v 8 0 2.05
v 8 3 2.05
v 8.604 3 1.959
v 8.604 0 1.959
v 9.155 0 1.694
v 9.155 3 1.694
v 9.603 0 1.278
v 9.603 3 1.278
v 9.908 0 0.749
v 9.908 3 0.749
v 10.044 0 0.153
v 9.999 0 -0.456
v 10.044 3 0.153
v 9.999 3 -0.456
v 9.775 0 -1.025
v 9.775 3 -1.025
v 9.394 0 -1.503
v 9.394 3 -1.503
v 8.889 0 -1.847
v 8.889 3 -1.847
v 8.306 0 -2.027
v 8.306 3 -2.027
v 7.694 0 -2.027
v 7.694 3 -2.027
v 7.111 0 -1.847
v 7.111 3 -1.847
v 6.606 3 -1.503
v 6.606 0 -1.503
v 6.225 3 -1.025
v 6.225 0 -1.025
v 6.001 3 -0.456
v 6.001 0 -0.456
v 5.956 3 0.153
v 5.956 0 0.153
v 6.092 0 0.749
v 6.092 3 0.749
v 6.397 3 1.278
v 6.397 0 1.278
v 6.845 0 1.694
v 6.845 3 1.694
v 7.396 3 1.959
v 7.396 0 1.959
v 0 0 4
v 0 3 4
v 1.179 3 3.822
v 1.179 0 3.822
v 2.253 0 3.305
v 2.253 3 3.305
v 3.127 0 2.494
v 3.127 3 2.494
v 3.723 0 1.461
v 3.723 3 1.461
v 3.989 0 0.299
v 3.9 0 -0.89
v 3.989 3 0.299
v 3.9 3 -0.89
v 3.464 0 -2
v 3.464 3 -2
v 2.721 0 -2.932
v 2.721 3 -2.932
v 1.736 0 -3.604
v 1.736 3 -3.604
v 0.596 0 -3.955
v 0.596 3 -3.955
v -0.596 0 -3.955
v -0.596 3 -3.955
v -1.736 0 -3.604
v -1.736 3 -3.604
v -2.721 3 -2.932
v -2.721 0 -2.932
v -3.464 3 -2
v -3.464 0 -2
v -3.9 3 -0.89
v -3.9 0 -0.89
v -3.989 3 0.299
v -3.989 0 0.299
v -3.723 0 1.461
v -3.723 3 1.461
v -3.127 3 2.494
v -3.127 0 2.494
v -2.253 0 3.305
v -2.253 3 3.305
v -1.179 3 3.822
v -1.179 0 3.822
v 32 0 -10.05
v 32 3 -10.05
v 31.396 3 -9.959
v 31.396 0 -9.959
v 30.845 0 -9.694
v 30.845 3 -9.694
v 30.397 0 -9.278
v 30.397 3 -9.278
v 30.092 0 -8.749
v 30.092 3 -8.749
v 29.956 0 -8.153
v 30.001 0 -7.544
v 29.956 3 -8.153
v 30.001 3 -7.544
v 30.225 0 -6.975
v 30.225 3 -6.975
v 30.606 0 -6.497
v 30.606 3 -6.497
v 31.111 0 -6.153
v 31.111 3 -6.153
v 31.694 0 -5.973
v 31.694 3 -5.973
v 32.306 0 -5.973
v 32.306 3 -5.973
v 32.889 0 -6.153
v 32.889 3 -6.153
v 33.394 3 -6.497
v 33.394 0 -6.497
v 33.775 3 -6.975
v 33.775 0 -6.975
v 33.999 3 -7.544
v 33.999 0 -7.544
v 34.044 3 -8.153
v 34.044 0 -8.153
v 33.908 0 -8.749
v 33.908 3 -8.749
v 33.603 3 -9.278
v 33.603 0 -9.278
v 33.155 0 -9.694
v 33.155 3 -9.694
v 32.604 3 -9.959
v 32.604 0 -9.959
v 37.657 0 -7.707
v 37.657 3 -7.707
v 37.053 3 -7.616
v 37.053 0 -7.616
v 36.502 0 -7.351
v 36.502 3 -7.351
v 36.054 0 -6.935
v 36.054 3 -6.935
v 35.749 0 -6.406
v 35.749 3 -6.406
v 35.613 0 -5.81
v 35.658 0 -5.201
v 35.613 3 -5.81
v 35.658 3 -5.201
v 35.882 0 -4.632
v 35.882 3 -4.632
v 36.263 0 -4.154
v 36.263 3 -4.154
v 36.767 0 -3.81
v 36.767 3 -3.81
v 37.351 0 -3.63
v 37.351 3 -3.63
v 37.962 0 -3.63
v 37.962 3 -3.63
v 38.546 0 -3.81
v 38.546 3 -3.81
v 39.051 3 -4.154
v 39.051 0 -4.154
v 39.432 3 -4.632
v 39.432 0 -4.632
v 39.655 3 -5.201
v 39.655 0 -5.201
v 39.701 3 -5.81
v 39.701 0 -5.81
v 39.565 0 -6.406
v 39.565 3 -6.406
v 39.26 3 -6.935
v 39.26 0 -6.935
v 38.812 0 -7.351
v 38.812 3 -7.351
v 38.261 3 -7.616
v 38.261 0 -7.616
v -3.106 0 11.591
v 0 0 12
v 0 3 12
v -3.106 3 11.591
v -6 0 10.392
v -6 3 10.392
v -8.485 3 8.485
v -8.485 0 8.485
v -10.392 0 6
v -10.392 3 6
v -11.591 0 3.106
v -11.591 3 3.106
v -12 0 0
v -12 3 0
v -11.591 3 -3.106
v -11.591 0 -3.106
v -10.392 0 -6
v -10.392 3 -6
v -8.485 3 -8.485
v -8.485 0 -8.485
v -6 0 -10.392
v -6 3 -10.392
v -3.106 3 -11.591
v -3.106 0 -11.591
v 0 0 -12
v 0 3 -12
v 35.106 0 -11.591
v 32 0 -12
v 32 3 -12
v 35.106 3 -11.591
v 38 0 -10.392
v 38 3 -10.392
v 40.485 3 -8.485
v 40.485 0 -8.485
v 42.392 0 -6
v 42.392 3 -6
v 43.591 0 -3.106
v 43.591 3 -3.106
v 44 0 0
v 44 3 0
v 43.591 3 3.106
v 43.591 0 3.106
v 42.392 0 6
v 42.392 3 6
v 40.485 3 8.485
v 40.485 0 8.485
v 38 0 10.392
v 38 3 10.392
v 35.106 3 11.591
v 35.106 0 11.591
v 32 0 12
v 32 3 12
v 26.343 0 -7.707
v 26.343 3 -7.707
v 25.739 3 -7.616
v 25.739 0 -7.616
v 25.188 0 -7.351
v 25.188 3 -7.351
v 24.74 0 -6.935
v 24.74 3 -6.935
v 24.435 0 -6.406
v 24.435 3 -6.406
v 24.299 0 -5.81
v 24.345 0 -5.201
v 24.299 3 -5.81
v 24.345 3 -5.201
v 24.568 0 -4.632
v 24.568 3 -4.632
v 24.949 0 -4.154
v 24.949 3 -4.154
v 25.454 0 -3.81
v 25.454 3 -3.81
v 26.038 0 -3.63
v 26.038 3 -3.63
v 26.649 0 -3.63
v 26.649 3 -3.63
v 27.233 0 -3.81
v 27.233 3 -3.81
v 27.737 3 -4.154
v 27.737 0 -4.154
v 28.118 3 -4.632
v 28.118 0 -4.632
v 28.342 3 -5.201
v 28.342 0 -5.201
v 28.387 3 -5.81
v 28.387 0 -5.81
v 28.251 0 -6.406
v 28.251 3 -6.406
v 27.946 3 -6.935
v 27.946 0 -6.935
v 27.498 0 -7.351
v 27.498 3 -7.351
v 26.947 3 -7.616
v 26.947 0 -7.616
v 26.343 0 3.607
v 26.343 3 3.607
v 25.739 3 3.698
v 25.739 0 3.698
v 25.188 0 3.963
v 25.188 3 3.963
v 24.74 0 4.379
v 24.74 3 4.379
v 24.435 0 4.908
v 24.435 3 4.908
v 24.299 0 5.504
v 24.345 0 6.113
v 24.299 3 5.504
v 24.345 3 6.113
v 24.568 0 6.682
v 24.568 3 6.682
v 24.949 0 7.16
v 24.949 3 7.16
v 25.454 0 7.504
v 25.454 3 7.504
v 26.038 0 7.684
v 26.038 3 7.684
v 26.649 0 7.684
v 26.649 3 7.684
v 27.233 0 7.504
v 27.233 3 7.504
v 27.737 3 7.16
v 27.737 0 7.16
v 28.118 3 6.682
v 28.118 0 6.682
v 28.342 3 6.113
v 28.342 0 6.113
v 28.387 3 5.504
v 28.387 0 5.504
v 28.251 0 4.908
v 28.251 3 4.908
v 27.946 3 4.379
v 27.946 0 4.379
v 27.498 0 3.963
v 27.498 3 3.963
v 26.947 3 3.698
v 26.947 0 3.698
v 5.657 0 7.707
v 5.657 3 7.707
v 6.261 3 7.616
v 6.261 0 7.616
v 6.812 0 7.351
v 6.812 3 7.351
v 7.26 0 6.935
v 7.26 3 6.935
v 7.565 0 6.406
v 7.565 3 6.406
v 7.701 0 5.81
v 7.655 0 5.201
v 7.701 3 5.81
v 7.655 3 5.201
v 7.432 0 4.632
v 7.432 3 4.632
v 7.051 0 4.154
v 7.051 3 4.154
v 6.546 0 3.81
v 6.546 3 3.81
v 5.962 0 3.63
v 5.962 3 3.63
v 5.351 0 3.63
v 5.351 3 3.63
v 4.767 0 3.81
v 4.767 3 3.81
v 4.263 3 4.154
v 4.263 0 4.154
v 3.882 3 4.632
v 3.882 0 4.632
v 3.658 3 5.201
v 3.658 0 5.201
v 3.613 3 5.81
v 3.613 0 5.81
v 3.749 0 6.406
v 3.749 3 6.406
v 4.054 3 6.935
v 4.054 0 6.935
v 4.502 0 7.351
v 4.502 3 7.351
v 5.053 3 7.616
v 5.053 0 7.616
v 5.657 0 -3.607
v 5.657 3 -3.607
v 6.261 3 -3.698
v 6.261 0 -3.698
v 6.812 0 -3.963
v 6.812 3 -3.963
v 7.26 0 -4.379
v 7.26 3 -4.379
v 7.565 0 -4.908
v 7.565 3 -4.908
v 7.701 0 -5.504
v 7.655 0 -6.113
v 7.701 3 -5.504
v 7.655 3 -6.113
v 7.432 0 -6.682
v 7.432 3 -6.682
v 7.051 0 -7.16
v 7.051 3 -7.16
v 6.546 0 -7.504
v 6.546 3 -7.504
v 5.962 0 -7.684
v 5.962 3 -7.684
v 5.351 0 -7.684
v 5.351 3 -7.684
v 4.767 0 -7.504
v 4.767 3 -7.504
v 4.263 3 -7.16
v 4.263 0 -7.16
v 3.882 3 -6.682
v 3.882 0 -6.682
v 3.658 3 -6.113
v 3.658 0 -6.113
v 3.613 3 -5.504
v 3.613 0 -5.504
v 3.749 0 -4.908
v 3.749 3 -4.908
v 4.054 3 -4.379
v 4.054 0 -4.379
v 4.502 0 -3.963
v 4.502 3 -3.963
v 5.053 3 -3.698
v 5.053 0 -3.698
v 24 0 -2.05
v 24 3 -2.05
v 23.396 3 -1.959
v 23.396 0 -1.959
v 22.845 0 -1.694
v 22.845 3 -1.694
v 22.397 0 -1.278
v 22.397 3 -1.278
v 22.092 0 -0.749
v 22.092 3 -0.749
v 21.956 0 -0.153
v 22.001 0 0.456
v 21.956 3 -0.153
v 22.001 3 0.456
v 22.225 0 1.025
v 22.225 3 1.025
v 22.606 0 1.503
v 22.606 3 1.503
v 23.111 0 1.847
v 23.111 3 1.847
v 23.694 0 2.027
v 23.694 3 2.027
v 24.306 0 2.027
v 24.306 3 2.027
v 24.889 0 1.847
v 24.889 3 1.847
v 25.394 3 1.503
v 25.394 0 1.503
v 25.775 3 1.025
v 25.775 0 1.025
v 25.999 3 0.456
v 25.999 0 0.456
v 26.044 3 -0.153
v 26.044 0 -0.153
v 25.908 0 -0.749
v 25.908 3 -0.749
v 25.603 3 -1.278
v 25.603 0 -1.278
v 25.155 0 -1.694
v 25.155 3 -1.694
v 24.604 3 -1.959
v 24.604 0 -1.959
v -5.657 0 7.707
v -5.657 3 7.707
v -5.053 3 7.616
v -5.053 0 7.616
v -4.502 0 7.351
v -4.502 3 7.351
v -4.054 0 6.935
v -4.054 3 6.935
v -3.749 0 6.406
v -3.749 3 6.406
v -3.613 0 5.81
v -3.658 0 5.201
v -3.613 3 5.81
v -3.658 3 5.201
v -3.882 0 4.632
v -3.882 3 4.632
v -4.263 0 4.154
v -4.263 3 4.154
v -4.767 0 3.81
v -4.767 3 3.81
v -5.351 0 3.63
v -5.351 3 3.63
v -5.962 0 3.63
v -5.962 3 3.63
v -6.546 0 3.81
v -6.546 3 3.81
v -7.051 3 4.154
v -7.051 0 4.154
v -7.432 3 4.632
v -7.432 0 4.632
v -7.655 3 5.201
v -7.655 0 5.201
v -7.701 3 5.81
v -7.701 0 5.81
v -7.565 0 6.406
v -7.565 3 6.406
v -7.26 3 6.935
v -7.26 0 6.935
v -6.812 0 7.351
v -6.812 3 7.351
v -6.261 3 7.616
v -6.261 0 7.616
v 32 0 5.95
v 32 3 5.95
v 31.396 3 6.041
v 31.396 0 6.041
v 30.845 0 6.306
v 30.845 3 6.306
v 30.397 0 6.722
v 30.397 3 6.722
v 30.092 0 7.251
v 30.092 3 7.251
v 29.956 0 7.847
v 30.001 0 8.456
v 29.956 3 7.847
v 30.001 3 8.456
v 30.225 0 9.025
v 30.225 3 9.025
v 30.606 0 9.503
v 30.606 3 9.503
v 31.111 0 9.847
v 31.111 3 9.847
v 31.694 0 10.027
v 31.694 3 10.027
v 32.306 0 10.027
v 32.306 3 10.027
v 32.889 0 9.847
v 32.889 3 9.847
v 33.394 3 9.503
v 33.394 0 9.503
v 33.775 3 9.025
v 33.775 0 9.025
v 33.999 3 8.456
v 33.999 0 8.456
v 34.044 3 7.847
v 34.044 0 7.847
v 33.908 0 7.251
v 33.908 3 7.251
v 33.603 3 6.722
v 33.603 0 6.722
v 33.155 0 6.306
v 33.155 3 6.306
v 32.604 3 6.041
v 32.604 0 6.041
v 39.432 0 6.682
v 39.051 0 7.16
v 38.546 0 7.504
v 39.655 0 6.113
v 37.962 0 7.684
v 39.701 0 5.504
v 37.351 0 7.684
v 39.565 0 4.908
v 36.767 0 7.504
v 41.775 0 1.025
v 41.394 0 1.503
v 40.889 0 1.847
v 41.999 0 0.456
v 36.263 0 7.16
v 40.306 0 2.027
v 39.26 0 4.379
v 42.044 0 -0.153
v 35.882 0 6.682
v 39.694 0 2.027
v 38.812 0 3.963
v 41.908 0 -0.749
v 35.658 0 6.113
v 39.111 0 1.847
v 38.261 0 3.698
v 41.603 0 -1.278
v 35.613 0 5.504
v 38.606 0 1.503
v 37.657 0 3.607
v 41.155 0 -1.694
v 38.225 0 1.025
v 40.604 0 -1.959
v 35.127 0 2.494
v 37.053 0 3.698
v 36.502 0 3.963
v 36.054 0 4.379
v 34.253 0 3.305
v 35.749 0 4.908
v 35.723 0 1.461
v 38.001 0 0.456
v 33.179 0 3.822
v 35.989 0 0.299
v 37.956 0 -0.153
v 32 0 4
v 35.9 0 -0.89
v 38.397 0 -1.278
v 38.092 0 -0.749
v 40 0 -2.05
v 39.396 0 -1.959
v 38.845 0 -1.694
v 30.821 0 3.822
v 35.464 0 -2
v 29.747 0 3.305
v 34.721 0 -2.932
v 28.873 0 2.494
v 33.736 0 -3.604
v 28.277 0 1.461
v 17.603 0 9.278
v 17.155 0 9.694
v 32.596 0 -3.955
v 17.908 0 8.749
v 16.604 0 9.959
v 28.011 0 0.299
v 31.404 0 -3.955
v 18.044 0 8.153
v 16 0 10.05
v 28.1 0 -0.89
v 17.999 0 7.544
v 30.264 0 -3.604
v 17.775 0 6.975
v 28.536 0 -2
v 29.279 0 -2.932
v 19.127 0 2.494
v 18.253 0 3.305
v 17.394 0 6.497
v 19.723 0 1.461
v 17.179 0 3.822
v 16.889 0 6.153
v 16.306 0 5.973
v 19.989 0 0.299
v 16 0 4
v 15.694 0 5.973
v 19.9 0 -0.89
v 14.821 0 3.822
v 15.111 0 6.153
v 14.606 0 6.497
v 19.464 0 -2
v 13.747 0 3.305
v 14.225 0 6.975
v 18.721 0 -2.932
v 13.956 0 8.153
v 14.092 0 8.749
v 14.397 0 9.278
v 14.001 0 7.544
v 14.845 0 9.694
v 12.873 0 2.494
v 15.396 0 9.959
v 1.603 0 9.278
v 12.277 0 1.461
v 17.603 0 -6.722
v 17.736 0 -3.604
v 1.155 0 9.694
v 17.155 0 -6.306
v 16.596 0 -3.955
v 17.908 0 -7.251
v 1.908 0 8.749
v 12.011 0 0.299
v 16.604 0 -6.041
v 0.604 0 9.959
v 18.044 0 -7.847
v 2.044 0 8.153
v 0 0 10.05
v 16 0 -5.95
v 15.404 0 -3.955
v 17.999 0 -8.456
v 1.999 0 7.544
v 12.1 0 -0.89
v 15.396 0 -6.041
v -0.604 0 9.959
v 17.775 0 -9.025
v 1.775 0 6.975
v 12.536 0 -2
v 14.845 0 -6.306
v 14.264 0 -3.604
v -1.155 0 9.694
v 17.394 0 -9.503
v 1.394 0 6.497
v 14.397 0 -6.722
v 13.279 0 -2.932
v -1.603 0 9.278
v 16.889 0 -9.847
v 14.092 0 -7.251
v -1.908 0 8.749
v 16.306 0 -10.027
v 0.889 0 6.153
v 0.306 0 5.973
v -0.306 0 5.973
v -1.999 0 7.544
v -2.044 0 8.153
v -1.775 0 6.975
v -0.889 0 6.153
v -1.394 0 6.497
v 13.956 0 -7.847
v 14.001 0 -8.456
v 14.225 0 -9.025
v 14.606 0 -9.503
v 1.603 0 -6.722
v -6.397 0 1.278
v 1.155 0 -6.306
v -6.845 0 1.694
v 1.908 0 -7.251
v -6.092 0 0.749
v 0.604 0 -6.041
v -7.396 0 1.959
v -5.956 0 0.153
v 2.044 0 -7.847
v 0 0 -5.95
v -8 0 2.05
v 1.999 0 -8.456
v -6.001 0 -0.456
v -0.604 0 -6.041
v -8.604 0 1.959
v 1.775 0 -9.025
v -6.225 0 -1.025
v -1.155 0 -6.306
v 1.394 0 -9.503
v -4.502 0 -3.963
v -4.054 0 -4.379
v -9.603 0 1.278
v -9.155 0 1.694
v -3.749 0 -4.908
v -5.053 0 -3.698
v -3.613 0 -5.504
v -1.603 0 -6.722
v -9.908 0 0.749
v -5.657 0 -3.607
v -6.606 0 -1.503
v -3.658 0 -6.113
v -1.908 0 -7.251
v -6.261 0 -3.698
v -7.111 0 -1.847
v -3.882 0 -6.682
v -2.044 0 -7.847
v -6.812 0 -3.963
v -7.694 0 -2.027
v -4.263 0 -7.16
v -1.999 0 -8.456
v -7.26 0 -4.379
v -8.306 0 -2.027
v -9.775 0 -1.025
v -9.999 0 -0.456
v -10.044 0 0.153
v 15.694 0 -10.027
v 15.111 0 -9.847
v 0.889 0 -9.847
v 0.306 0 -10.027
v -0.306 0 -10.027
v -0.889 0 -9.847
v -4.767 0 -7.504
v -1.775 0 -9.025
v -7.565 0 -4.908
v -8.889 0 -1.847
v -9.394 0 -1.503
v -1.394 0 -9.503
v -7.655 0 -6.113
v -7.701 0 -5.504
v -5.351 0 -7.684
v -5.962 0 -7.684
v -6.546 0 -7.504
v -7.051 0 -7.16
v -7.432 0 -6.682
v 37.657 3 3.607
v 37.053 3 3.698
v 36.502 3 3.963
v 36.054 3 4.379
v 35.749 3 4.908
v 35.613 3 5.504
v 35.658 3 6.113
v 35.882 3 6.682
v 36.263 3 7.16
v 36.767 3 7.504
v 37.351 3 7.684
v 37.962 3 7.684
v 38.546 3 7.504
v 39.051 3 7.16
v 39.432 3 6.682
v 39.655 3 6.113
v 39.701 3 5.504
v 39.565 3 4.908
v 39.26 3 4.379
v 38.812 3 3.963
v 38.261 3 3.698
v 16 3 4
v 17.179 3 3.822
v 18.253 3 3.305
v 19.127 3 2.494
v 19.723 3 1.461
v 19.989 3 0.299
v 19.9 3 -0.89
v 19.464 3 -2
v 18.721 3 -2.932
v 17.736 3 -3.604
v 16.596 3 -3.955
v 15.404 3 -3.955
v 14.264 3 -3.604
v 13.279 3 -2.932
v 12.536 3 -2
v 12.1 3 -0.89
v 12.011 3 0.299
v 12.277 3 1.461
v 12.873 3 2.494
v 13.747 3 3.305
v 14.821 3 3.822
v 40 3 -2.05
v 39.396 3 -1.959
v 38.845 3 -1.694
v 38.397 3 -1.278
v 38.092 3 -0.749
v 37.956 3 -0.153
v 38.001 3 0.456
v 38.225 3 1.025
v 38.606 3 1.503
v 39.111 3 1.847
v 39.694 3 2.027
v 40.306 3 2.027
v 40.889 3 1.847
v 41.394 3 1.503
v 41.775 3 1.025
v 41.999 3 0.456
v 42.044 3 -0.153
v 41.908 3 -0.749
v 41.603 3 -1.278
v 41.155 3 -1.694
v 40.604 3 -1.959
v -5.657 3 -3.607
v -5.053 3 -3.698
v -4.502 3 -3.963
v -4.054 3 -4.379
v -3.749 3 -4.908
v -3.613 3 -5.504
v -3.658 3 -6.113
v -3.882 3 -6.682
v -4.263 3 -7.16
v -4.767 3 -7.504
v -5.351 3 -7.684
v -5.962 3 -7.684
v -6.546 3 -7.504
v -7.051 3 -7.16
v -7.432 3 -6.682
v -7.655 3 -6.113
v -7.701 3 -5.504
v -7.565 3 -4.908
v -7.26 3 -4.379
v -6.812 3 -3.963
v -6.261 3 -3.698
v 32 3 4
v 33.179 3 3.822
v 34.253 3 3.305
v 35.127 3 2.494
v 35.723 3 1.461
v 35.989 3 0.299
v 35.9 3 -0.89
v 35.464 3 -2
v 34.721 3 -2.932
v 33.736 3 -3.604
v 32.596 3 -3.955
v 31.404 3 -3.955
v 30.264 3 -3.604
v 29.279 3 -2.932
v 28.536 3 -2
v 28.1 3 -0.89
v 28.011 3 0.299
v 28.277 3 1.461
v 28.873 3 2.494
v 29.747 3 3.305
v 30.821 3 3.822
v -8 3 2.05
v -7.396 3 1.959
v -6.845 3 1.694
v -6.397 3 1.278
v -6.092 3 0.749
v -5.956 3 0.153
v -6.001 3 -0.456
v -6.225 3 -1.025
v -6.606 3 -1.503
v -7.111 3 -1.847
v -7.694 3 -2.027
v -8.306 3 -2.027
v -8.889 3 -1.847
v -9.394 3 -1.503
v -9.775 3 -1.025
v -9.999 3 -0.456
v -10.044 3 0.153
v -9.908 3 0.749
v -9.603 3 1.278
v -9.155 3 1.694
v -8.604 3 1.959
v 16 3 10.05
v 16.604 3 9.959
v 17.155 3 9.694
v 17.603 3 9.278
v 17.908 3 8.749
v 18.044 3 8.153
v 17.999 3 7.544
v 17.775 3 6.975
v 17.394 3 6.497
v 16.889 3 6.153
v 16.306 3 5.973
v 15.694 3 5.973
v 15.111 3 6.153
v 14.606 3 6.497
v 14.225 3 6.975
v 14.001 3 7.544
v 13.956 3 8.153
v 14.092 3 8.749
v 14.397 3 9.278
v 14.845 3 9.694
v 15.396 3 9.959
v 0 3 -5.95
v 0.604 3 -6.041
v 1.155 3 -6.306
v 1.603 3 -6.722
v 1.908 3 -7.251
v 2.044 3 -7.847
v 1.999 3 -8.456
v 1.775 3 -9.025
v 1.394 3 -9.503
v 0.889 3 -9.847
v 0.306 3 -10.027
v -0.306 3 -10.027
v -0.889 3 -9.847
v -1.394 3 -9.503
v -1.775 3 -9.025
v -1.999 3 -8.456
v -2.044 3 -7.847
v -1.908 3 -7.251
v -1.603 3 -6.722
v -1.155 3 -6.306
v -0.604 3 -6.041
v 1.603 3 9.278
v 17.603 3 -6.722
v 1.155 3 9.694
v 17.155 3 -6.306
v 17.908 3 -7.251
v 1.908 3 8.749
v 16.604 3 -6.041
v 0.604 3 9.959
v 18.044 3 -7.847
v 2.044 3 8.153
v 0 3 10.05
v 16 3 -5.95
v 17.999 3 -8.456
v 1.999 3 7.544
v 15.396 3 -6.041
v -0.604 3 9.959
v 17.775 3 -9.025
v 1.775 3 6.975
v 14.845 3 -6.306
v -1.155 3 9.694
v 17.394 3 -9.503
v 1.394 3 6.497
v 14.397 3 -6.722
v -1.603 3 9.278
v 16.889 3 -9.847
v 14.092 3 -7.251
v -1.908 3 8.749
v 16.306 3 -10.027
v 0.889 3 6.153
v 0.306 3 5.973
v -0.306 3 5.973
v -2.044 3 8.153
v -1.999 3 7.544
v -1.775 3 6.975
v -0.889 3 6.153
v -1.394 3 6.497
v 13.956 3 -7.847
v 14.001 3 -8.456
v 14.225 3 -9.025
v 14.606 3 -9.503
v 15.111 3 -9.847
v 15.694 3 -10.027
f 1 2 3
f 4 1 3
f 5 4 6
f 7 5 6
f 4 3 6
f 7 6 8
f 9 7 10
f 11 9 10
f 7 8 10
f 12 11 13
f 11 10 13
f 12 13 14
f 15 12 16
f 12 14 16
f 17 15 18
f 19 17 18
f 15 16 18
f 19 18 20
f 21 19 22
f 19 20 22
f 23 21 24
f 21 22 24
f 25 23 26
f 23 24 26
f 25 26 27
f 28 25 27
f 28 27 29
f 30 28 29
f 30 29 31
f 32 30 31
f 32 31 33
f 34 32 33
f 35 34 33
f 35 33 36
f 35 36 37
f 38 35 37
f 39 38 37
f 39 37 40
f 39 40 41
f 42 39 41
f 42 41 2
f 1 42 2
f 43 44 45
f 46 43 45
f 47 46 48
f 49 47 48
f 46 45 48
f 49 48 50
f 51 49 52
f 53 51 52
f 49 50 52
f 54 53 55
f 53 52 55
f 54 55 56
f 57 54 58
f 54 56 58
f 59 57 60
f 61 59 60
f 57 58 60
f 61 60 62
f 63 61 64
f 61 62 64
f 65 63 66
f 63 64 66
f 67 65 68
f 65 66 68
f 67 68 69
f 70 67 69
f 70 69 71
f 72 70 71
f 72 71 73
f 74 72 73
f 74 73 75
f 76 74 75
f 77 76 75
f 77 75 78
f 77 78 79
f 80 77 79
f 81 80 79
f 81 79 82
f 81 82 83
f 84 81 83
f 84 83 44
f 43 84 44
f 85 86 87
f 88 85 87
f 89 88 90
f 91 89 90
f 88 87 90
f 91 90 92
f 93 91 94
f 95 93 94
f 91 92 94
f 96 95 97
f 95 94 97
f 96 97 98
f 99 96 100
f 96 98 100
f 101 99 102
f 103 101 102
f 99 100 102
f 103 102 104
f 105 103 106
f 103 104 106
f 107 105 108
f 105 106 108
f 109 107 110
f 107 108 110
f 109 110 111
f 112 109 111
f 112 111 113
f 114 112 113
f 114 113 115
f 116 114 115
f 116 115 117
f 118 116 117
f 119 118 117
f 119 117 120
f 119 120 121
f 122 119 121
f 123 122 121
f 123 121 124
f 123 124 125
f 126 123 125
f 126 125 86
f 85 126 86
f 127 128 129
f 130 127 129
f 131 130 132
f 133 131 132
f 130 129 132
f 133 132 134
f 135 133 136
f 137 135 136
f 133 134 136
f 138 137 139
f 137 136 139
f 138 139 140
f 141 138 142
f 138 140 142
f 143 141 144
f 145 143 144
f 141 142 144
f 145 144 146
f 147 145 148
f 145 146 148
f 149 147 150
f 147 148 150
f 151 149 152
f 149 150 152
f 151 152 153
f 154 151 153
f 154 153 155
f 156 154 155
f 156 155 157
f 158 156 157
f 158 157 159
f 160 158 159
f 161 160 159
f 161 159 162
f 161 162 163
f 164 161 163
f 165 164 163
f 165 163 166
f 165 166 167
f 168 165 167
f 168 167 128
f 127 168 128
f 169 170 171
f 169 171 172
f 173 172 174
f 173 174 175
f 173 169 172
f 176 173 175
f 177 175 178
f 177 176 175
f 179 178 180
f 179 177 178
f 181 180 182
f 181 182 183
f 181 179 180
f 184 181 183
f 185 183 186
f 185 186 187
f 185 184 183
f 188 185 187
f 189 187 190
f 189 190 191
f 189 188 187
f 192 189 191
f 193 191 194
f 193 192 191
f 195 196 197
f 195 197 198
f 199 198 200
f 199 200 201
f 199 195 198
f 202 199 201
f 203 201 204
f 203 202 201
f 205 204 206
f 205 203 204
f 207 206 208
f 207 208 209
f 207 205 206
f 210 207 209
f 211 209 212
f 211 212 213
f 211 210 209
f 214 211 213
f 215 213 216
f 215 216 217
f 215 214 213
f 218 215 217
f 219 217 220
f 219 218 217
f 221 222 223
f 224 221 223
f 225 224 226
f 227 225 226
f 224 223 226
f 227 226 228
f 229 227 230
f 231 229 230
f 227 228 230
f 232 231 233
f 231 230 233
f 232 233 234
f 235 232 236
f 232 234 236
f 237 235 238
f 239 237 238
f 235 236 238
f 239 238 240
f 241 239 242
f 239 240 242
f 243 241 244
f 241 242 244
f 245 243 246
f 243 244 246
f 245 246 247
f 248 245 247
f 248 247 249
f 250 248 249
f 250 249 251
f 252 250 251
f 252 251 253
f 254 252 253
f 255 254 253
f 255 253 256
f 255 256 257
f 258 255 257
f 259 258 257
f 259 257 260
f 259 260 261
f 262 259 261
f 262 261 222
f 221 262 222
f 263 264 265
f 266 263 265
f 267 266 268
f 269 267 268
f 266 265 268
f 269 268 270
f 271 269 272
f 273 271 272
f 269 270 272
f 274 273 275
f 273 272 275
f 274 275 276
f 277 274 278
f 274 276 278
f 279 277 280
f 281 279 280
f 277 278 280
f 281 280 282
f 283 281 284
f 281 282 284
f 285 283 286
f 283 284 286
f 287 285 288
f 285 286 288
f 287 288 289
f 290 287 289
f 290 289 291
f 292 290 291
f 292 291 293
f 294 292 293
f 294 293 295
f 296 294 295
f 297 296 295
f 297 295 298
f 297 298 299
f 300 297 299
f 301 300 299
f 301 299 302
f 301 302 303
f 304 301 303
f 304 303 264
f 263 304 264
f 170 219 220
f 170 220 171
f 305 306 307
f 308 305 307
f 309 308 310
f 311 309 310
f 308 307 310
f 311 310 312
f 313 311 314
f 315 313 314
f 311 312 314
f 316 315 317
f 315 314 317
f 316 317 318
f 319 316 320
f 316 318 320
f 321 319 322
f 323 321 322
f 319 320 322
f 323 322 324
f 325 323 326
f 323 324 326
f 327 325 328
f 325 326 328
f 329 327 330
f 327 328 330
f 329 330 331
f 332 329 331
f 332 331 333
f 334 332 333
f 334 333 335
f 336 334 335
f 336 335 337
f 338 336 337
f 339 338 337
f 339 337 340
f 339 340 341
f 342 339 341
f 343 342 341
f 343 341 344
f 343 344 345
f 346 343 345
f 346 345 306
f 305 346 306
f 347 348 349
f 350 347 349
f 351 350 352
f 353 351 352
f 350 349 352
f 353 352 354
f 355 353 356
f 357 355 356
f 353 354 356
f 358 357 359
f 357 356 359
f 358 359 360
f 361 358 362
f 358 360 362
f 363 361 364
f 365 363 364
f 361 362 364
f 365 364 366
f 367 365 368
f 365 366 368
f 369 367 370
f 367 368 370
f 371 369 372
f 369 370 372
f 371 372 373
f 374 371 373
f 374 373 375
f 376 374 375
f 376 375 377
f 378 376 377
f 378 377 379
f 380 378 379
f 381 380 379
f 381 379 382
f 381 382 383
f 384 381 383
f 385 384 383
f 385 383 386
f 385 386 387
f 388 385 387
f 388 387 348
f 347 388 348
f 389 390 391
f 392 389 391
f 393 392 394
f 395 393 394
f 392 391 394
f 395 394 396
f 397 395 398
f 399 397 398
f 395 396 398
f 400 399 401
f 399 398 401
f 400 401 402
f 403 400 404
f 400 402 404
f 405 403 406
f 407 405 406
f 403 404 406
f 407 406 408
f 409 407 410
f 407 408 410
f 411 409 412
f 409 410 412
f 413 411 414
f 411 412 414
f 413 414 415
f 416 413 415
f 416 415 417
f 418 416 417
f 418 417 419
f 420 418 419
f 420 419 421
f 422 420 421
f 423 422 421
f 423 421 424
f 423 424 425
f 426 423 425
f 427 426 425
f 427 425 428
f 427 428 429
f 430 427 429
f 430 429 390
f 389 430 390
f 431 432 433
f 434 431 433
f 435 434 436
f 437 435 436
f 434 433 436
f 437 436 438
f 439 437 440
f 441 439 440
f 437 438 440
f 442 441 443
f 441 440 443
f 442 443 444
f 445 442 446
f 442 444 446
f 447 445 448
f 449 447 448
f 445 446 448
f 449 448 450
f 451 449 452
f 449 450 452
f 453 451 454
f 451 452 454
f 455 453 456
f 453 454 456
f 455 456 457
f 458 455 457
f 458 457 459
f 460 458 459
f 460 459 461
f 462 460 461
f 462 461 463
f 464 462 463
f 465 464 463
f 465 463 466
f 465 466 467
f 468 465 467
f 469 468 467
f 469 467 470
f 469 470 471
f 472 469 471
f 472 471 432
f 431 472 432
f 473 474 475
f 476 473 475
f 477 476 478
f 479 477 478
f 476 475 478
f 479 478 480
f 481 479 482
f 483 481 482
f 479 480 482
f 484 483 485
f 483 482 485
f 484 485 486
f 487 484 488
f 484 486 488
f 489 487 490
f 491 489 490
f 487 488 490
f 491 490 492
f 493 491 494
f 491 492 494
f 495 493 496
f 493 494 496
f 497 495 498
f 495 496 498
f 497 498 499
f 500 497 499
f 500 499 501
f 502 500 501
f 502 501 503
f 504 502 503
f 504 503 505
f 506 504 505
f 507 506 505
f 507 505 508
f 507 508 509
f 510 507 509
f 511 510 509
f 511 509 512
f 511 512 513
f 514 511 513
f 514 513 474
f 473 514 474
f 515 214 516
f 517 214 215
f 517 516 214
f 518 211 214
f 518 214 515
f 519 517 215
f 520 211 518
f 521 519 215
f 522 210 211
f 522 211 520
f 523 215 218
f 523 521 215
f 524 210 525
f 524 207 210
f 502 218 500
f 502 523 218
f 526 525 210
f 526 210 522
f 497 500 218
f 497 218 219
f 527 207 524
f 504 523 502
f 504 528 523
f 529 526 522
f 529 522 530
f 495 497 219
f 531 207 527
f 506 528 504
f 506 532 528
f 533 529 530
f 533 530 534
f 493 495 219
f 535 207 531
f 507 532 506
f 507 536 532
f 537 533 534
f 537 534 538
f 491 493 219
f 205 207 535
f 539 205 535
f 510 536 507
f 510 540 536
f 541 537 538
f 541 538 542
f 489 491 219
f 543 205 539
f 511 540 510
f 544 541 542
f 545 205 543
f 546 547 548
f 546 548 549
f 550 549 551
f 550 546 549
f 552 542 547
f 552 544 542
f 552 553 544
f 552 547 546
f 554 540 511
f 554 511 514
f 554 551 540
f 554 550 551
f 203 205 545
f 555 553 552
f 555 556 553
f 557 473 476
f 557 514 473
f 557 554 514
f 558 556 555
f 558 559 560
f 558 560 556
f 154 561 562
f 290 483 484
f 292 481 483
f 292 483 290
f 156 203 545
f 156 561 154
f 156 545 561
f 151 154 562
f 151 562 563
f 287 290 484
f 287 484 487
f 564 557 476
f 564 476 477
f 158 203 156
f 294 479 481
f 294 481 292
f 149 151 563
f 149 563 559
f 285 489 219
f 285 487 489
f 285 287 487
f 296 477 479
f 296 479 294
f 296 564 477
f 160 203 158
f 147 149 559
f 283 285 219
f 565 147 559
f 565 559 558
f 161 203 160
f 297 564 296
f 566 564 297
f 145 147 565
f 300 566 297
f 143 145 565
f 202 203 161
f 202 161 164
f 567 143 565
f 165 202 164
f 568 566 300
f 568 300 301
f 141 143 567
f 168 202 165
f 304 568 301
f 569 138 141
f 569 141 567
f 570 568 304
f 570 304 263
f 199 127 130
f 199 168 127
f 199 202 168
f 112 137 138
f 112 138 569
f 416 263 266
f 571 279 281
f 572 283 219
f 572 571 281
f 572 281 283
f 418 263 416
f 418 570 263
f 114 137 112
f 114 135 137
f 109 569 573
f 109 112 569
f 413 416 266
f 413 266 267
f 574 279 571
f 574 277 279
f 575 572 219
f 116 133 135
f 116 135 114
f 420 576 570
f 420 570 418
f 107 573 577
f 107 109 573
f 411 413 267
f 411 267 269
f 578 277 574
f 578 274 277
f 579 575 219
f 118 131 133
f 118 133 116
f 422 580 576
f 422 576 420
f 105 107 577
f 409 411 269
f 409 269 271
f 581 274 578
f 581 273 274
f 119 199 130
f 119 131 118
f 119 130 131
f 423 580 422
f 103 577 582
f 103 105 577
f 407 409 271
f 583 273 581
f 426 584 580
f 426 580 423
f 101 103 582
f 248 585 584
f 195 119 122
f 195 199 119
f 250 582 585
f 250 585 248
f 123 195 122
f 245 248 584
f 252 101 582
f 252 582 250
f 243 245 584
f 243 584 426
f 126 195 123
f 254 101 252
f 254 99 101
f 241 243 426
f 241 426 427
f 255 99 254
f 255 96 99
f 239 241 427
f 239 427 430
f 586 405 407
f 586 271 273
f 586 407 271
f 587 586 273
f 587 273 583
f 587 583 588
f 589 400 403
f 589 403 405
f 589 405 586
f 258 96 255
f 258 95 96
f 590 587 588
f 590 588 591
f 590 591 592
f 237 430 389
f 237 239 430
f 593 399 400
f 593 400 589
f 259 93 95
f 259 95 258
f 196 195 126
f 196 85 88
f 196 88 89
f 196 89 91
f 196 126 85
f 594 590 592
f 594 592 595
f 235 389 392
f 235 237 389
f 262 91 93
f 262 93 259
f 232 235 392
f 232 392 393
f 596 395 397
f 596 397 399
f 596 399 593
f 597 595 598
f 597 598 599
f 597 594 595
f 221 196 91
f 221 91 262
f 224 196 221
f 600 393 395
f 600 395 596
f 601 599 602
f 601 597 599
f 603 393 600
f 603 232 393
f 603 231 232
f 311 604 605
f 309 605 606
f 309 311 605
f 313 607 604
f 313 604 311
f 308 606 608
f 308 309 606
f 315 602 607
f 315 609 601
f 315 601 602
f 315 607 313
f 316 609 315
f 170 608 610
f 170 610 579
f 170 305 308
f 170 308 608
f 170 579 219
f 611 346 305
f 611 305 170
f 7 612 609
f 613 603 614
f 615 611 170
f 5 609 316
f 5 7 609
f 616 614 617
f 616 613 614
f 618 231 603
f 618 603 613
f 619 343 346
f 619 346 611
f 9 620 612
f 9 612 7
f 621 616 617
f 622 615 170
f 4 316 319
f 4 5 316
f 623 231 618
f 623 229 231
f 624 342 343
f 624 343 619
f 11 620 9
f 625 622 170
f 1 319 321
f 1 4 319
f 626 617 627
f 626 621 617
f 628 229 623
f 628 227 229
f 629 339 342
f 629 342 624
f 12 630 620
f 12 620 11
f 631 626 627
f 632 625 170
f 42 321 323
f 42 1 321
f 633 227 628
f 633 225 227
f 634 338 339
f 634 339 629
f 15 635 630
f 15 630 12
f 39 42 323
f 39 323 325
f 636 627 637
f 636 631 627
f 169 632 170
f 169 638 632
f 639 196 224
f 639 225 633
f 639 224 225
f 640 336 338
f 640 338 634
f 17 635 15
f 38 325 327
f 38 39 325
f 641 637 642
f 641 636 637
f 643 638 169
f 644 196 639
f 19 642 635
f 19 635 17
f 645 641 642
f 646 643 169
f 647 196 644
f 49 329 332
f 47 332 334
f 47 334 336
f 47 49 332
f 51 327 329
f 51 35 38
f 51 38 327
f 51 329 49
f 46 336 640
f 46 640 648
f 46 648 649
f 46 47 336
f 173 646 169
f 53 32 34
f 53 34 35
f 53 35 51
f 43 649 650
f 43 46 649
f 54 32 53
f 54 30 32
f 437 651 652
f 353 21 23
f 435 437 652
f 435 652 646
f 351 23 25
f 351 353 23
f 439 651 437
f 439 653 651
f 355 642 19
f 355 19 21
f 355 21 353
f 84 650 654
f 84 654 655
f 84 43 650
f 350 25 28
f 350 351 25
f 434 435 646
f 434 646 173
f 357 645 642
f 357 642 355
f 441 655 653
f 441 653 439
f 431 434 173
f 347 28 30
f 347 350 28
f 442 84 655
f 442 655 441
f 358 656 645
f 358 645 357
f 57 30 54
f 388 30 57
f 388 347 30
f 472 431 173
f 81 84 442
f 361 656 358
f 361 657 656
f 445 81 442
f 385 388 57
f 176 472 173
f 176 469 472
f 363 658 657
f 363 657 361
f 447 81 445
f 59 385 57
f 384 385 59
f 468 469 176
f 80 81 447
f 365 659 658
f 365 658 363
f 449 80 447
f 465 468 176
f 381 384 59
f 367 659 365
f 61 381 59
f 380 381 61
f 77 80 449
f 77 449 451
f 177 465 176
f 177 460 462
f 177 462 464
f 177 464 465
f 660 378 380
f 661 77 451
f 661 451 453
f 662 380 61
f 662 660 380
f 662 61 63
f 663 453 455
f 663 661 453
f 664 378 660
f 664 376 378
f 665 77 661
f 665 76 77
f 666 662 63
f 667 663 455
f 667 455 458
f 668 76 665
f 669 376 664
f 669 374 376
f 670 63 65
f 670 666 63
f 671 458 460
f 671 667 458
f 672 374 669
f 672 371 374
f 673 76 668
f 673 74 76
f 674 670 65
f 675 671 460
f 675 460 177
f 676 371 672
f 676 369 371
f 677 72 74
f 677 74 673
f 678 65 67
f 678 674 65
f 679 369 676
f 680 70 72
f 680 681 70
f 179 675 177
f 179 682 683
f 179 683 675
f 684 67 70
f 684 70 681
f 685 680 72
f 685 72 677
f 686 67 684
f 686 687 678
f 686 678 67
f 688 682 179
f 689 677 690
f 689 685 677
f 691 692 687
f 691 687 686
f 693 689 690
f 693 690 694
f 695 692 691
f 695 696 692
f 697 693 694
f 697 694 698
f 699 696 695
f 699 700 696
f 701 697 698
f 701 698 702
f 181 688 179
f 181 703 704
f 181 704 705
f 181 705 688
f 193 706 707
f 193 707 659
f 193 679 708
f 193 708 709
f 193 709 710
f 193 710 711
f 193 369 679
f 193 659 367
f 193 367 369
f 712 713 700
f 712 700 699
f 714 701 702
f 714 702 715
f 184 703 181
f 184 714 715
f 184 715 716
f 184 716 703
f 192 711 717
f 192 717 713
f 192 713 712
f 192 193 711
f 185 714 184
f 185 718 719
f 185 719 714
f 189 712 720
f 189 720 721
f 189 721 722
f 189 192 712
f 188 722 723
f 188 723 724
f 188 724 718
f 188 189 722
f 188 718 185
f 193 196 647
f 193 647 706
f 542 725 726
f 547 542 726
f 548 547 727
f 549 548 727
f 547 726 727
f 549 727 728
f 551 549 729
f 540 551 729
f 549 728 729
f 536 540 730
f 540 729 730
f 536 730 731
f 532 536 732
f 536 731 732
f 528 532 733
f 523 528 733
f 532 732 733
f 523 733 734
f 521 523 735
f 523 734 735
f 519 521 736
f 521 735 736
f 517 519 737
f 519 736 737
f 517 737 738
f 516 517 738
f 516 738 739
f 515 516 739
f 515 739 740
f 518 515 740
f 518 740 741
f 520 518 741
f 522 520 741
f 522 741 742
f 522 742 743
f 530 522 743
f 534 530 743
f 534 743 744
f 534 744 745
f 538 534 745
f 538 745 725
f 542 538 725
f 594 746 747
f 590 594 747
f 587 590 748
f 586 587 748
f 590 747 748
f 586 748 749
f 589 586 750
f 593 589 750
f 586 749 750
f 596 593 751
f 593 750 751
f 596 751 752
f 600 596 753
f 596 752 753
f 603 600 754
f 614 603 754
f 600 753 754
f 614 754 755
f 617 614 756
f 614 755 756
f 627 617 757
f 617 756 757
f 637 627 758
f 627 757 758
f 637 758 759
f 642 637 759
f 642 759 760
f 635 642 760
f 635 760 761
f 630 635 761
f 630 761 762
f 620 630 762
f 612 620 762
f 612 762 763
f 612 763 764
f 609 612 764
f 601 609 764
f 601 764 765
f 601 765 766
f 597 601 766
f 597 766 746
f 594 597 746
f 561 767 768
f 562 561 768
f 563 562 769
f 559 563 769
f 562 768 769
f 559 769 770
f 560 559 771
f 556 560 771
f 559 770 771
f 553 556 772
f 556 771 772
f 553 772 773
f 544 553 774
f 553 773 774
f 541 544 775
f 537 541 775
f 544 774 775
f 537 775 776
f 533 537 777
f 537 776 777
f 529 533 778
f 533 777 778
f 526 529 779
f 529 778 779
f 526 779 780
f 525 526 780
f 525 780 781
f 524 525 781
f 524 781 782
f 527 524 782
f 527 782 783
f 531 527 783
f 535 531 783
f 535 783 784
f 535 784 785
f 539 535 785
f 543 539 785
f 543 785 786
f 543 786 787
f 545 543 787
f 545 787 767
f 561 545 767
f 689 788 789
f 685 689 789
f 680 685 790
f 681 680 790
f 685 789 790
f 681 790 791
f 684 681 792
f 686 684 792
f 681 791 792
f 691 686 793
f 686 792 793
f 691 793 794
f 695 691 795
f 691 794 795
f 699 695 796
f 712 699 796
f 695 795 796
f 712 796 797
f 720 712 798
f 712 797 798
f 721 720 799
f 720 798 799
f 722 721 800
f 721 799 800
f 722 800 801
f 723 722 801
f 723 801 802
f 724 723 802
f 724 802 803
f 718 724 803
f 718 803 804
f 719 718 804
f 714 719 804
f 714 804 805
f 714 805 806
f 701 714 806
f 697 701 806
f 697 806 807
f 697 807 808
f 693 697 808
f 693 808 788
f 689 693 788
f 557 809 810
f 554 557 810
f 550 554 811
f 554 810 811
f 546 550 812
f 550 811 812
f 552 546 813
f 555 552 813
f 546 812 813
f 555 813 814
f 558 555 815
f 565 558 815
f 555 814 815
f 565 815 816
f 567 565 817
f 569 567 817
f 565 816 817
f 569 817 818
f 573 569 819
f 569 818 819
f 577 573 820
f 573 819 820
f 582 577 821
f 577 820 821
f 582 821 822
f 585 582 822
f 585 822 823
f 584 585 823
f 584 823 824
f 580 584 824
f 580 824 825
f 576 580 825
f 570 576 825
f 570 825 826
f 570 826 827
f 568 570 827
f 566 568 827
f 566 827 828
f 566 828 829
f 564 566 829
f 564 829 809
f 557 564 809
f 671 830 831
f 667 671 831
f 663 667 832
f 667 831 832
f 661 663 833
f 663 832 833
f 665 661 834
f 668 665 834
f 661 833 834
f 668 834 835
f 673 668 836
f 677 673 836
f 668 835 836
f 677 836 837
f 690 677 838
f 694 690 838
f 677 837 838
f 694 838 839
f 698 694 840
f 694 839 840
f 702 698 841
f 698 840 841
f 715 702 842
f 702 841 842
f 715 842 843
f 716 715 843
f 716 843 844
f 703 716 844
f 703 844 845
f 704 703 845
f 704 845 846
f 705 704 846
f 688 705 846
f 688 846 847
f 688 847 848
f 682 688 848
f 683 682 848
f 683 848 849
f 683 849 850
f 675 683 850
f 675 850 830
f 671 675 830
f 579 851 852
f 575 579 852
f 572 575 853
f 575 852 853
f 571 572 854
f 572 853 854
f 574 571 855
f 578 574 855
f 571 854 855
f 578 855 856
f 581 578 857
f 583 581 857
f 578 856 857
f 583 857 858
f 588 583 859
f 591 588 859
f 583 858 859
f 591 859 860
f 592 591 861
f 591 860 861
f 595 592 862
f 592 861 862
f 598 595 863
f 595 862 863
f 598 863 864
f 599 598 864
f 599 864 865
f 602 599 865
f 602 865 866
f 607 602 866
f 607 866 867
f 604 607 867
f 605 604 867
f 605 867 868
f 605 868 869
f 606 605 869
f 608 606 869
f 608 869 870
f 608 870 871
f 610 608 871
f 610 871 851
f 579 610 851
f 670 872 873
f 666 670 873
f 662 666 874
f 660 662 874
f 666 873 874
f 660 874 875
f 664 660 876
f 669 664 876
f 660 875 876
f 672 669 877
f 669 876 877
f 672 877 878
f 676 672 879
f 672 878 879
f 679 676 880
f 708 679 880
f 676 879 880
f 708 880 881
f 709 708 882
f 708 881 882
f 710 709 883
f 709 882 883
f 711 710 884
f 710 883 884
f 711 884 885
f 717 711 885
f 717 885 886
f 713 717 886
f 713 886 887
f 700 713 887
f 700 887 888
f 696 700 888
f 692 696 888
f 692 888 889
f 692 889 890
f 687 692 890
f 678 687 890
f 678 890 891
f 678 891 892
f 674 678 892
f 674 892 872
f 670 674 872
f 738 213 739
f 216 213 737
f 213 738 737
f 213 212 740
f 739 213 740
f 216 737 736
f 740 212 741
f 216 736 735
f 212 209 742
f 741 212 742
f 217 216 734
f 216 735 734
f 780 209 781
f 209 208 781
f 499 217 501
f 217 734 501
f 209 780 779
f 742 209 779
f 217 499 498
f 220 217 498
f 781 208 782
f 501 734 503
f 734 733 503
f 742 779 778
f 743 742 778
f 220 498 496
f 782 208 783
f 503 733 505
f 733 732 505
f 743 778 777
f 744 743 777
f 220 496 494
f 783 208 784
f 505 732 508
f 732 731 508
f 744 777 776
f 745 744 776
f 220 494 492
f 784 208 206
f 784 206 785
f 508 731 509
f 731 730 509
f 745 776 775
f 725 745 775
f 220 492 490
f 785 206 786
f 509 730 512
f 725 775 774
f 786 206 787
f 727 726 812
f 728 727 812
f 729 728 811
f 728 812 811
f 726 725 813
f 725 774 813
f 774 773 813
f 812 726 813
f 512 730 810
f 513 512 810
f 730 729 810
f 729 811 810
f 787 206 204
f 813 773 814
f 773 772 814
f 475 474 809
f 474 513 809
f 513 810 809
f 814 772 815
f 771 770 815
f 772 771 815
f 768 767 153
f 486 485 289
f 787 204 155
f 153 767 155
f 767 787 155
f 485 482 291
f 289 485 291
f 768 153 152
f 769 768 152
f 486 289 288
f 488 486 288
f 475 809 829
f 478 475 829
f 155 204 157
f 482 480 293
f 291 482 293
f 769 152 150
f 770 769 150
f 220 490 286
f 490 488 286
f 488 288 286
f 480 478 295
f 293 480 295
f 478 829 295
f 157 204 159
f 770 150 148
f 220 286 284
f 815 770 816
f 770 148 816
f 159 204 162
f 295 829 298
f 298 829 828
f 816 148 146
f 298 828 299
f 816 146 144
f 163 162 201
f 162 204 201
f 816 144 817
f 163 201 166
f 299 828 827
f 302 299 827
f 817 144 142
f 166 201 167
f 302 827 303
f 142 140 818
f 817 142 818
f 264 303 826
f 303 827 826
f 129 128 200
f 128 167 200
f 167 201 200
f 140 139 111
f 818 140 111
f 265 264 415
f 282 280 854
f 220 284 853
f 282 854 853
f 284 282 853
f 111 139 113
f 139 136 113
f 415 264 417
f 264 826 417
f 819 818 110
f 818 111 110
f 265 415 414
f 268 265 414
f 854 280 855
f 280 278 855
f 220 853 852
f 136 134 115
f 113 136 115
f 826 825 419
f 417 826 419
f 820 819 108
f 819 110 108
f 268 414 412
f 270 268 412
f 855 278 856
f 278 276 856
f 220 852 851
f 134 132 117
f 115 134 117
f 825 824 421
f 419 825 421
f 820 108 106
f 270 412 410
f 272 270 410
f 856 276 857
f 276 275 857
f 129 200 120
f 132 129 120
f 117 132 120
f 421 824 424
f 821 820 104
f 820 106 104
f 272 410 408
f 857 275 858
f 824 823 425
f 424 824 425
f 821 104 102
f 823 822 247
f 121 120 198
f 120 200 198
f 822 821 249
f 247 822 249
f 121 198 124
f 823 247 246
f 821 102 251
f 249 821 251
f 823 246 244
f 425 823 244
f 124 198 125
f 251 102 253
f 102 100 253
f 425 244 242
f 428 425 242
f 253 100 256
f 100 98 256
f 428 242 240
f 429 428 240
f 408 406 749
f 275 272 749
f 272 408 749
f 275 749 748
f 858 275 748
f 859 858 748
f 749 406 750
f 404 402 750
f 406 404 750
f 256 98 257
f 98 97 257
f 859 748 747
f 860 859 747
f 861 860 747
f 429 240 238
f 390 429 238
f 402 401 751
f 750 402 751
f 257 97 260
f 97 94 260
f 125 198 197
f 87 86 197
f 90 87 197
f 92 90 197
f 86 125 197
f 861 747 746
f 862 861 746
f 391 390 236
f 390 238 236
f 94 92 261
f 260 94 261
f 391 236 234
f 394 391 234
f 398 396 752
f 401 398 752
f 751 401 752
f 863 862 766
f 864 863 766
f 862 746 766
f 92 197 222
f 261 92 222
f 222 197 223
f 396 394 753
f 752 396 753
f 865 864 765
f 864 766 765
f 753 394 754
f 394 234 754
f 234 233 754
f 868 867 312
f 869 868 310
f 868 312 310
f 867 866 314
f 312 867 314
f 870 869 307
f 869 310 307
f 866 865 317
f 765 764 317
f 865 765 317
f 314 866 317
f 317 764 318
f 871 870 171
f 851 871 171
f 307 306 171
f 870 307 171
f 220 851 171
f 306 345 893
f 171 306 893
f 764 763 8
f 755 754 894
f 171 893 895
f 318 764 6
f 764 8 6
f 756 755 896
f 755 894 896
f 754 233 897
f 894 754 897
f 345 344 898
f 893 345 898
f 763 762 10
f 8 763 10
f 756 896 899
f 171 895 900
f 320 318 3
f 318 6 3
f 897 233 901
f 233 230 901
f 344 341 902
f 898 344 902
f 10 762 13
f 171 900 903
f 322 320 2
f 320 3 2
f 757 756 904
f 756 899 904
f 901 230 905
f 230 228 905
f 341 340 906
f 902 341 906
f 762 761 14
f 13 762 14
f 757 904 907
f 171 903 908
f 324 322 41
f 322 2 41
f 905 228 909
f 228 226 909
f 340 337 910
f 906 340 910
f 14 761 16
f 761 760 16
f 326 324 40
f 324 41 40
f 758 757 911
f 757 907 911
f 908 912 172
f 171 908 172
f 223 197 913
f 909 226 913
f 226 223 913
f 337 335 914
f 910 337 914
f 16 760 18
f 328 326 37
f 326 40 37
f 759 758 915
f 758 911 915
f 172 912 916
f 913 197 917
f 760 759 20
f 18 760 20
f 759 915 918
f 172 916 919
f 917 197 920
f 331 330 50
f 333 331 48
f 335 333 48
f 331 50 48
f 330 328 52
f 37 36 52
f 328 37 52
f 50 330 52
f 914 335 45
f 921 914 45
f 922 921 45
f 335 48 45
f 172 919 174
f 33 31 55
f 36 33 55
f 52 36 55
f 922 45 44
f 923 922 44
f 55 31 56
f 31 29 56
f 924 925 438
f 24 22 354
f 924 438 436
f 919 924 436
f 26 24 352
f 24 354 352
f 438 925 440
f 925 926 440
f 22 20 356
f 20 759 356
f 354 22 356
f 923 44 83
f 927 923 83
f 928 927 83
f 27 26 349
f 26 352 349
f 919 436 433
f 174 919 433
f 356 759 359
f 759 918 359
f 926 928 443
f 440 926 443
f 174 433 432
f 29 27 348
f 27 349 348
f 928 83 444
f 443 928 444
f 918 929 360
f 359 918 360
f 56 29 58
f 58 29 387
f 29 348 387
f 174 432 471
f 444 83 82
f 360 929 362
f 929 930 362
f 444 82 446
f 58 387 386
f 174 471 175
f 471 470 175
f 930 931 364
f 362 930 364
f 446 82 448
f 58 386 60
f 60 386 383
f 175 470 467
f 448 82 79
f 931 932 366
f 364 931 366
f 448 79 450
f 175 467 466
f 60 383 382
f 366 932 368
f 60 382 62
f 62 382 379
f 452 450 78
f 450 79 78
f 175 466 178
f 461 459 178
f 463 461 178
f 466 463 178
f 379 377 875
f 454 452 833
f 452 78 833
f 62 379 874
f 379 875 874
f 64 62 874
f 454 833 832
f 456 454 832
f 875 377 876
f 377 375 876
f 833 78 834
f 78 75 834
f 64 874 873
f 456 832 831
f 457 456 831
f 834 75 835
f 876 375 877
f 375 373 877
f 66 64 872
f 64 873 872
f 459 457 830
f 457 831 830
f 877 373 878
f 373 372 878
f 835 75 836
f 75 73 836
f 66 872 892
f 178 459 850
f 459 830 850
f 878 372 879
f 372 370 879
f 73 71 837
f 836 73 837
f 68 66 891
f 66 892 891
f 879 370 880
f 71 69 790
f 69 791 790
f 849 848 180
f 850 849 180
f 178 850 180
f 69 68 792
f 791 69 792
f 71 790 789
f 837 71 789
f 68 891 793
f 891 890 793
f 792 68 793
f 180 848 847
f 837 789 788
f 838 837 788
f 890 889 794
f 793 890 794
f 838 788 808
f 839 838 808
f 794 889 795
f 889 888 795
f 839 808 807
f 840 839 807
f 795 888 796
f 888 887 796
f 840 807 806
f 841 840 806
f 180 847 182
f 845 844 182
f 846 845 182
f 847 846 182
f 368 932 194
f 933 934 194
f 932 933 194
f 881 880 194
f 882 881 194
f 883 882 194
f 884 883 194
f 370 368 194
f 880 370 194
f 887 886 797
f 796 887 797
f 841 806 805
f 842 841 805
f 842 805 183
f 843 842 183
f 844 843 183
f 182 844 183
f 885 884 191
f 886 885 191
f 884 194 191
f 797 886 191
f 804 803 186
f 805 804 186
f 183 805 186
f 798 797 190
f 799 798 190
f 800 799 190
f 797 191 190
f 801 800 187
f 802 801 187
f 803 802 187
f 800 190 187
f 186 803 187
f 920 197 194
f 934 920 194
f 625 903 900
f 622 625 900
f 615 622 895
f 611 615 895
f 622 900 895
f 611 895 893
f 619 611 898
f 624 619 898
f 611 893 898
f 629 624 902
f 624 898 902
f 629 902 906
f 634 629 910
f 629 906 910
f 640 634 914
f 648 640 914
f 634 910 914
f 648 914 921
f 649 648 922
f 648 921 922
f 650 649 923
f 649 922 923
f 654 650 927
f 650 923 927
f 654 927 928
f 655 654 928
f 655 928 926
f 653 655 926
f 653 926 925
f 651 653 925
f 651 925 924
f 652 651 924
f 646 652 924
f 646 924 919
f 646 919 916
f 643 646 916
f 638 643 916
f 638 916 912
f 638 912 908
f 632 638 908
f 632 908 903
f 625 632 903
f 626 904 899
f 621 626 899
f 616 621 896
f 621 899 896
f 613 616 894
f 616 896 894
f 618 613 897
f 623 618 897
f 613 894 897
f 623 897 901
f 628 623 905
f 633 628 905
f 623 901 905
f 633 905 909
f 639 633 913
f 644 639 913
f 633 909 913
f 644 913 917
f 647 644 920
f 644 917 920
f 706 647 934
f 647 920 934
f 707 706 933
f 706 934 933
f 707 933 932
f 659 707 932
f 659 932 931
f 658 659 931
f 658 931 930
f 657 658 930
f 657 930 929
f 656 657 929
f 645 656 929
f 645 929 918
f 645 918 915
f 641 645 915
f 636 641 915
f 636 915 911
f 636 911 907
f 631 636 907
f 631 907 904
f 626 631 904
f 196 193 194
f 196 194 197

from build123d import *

# Parameters (mm, degrees)
BOSS_EXTRUDE1_DEPTH = 3
SKETCH2_R           = 4
CUT_EXTRUDE1_DEPTH  = 46.705579528
SKETCH3_R           = 2.05
CUT_EXTRUDE2_DEPTH  = 46.705579528


with BuildPart() as part:
    # Sketch1 → Boss-Extrude1 (new body)
    with BuildSketch(Plane(origin=(0, 0, 0), x_dir=(1, 0, 0), z_dir=(0, 1, 0))):
        with BuildLine():
            Line((0, 12), (32, 12))
            ThreePointArc((32, 12), (44, 0), (32, -12))
            Line((32, -12), (0, -12))
            ThreePointArc((0, -12), (-12, 0), (0, 12))
        make_face()
    extrude(amount=BOSS_EXTRUDE1_DEPTH)

    # Sketch2 → Cut-Extrude1 (cut, through all)
    with BuildSketch(Plane(origin=(0, 3, 0), x_dir=(1, 0, 0), z_dir=(0, 1, 0))):
        with Locations(Location((0, 0, 0), (0, 0, 270))):
            Circle(SKETCH2_R)
        with Locations(Location((16, 0, 0), (0, 0, 270))):
            Circle(SKETCH2_R)
        with Locations(Location((32, 0, 0), (0, 0, 270))):
            Circle(SKETCH2_R)
    extrude(amount=-CUT_EXTRUDE1_DEPTH, mode=Mode.SUBTRACT)

    # Sketch3 → Cut-Extrude2 (cut, through all)
    with BuildSketch(Plane(origin=(0, 3, 0), x_dir=(1, 0, 0), z_dir=(0, 1, 0))):
        with Locations(Location((0, 8, 0), (0, 0, 270))):
            Circle(SKETCH3_R)
        with Locations(Location((5.656854249, 5.656854249, 0), (0, 0, 270))):
            Circle(SKETCH3_R)
        with Locations(Location((8, 0, 0), (0, 0, 270))):
            Circle(SKETCH3_R)
        with Locations(Location((5.656854249, -5.656854249, 0), (0, 0, 270))):
            Circle(SKETCH3_R)
        with Locations(Location((0, -8, 0), (0, 0, 270))):
            Circle(SKETCH3_R)
        with Locations(Location((-5.656854249, -5.656854249, 0), (0, 0, 270))):
            Circle(SKETCH3_R)
        with Locations(Location((-8, 0, 0), (0, 0, 270))):
            Circle(SKETCH3_R)
        with Locations(Location((-5.656854249, 5.656854249, 0), (0, 0, 270))):
            Circle(SKETCH3_R)
        with Locations(Location((26.343145751, -5.656854249, 0), (0, 0, 90))):
            Circle(SKETCH3_R)
        with Locations(Location((32, -8, 0), (0, 0, 90))):
            Circle(SKETCH3_R)
        with Locations(Location((37.656854249, -5.656854249, 0), (0, 0, 90))):
            Circle(SKETCH3_R)
        with Locations(Location((40, 0, 0), (0, 0, 90))):
            Circle(SKETCH3_R)
        with Locations(Location((37.656854249, 5.656854249, 0), (0, 0, 90))):
            Circle(SKETCH3_R)
        with Locations(Location((32, 8, 0), (0, 0, 90))):
            Circle(SKETCH3_R)
        with Locations(Location((26.343145751, 5.656854249, 0), (0, 0, 90))):
            Circle(SKETCH3_R)
        with Locations(Location((24, 0, 0), (0, 0, 90))):
            Circle(SKETCH3_R)
        with Locations(Location((16, 8, 0), (0, 0, 270))):
            Circle(SKETCH3_R)
        with Locations(Location((16, -8, 0), (0, 0, 270))):
            Circle(SKETCH3_R)
    extrude(amount=-CUT_EXTRUDE2_DEPTH, mode=Mode.SUBTRACT)


solid = part.part
